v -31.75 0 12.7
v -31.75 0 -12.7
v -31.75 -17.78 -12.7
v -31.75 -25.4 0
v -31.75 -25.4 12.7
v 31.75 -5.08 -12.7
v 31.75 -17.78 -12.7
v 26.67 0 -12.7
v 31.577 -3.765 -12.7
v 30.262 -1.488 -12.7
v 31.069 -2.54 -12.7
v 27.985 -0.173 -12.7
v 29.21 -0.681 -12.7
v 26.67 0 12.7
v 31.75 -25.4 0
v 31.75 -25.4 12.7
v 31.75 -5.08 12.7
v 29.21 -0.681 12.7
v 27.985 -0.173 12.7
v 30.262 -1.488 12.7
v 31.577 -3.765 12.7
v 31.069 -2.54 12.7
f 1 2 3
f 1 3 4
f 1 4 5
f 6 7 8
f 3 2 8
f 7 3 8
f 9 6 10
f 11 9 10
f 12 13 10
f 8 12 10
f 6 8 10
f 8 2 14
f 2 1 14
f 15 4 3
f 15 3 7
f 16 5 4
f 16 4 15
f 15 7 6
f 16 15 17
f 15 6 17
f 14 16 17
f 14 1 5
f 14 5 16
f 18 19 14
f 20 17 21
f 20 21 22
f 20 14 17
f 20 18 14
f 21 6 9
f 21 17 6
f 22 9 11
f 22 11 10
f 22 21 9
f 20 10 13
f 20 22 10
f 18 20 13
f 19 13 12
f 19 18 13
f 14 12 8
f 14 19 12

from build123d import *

# Parameters (mm, degrees)
F0_W     = 63.5
F0_H     = 25.4
F1_DEPTH = 25.4
F2_R     = 5.08
F3_SIZE2 = 12.7
F3_SIZE  = 7.62


with BuildPart() as f1:
    # F0 (on Front) → F1 (new body)
    with BuildSketch(Plane.XZ):
        Rectangle(F0_W, F0_H)
    extrude(amount=F1_DEPTH)

    # F2
    f2_edges = [f1.edges().sort_by_distance(p)[0] for p in [
        (31.75, 0, 0),
    ]]
    fillet(f2_edges, radius=F2_R)

    # F3
    f3_edges = [f1.edges().sort_by_distance(p)[0] for p in [
        (0, -25.4, -12.7),
    ]]
    chamfer(f3_edges, length=F3_SIZE, length2=F3_SIZE2)


solid = f1.part
